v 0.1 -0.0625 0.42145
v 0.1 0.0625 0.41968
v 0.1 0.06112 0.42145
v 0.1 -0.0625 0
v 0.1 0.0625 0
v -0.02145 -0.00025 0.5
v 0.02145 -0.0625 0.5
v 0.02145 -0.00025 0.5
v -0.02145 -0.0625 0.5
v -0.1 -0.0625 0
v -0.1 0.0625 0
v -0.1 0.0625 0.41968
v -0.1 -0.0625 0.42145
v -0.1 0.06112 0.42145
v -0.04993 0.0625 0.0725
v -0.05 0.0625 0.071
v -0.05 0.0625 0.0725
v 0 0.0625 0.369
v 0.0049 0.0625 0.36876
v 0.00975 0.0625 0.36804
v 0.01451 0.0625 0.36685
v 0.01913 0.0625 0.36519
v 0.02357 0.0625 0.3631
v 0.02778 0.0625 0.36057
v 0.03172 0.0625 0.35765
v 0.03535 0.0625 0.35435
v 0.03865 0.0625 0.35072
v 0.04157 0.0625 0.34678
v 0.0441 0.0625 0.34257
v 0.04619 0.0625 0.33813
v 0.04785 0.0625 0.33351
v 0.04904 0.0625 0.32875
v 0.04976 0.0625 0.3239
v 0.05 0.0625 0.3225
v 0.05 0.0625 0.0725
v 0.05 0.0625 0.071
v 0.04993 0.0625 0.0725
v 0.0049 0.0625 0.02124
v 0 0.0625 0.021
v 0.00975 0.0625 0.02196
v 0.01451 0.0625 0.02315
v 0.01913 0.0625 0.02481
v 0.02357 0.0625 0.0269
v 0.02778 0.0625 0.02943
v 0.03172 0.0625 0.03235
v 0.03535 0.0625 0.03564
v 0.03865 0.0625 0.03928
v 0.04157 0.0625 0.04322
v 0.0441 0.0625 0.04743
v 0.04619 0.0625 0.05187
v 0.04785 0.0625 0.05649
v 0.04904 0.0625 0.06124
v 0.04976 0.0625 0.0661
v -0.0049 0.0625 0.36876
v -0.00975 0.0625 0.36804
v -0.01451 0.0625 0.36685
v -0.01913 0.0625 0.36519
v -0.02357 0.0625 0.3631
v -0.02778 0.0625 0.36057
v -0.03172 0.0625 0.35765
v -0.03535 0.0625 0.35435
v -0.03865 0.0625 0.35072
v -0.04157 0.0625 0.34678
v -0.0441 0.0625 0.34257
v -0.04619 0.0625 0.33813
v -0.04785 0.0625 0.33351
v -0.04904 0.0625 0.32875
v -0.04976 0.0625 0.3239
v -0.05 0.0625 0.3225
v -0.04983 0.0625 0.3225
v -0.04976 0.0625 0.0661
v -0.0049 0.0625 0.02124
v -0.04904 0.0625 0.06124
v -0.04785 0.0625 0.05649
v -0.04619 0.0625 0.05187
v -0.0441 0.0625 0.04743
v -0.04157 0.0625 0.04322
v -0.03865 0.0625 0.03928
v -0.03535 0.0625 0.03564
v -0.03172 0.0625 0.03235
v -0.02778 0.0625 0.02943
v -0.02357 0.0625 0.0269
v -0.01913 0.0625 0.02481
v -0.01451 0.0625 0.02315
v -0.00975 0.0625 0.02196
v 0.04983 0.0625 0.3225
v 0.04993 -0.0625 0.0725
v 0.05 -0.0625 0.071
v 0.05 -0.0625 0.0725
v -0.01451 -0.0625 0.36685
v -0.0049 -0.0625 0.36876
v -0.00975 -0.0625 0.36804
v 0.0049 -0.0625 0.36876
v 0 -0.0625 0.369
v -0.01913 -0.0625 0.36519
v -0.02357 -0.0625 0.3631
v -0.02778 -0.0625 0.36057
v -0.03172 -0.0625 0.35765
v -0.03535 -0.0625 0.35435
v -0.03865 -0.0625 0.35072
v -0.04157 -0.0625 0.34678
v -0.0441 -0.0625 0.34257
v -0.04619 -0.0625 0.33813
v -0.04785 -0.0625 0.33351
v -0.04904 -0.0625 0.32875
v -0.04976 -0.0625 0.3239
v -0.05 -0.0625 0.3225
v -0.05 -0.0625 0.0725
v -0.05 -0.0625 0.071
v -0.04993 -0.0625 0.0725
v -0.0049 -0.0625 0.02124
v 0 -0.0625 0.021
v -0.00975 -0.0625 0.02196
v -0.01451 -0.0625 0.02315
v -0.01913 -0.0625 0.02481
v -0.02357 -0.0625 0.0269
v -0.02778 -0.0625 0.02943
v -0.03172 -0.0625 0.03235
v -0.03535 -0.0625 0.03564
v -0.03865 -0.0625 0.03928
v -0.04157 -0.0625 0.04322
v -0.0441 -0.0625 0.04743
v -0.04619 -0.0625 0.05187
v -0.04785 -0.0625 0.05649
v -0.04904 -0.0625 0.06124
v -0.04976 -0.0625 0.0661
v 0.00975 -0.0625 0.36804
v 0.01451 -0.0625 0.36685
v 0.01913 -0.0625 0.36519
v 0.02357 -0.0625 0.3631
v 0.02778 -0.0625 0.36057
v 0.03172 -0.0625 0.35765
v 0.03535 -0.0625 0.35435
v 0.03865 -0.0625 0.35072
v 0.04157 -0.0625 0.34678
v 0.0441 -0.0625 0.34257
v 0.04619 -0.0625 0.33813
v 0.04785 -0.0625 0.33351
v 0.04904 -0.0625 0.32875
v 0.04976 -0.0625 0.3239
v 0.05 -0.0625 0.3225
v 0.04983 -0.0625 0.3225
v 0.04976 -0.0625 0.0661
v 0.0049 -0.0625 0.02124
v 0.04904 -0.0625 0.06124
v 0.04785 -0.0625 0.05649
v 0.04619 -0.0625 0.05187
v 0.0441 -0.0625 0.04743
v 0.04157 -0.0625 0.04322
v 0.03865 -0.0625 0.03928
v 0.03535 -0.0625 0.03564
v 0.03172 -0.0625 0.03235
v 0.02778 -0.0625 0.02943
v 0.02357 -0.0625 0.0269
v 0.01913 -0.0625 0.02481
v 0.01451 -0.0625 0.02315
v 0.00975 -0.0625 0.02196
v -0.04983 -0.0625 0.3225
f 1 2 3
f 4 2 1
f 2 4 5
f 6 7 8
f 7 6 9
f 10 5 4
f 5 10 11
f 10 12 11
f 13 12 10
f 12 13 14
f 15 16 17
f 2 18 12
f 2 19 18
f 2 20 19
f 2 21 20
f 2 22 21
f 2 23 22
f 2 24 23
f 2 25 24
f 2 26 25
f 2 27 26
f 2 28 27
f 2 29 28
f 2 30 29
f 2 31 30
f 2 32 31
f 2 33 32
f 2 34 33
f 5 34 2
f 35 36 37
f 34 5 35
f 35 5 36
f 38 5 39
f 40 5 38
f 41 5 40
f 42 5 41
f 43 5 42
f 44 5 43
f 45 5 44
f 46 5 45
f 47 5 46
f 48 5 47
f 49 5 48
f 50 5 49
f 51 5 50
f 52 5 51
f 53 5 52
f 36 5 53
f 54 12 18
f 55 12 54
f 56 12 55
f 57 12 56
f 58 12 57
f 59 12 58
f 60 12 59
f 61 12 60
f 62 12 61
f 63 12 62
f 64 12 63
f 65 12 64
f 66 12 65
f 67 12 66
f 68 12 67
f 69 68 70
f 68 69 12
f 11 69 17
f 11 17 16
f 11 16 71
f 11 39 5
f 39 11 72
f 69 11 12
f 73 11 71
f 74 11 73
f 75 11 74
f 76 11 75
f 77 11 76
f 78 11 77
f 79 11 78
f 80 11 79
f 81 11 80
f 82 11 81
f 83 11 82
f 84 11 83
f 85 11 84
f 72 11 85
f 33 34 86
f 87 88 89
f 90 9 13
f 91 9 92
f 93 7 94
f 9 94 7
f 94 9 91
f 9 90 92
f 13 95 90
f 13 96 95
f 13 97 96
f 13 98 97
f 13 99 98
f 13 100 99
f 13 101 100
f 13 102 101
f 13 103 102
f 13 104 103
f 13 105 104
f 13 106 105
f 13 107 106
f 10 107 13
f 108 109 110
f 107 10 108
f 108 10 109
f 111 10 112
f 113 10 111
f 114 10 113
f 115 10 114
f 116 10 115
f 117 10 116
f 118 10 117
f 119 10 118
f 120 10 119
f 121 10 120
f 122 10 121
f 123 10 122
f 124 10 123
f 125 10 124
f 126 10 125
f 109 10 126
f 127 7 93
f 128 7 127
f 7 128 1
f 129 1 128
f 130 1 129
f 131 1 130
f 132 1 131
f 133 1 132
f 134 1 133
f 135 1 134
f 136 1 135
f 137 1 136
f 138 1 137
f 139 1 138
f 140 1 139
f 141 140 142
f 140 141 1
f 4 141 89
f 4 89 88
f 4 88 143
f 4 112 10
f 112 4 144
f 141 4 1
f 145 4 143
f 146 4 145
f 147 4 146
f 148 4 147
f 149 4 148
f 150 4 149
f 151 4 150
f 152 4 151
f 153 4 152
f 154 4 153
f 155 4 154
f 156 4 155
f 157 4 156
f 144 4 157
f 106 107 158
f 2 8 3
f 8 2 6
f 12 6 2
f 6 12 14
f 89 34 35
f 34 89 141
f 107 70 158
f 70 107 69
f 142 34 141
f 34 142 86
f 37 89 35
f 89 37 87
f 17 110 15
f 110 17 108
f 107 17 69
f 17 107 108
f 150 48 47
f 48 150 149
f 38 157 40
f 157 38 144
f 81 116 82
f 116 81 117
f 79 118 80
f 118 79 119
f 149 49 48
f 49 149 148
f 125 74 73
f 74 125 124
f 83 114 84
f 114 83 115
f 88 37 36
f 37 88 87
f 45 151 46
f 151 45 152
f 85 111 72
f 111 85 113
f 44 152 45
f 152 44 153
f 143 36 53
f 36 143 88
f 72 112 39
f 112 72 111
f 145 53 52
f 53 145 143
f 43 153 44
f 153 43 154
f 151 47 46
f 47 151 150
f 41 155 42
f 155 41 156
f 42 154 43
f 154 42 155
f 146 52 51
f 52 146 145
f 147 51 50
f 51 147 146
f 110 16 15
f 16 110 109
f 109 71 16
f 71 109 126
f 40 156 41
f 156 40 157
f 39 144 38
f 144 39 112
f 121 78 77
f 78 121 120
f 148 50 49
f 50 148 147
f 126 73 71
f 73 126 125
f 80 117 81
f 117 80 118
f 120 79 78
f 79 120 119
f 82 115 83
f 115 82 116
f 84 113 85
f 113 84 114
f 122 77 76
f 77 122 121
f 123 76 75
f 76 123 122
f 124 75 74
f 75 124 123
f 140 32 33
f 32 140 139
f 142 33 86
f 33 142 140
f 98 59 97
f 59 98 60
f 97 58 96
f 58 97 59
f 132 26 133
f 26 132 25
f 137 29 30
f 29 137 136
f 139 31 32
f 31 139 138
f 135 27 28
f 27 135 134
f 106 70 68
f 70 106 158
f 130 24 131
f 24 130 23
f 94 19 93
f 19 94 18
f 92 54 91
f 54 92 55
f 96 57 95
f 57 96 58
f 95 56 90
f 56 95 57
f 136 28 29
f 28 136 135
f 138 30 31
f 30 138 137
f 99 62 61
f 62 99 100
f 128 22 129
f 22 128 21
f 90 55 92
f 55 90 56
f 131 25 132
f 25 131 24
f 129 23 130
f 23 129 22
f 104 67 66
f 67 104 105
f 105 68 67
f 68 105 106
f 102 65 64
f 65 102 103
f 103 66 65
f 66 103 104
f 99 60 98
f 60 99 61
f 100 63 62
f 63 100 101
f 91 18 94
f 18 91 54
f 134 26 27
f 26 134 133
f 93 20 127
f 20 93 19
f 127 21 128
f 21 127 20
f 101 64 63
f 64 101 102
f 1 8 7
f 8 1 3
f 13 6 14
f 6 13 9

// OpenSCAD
// ----------------------------------------------------------------------------------------------------
// PROJECT INFORMATION

// NAME:  Robot Body
// REVISION:  A1
// START DATE:  7/4/2023
// CURRENT VERSION DATE:  7/12/2023
// LICENSE:  GPLv3
// AUTHOR:  Justin Grimes (@zelon88)
// DESCRIPTION:  A body for tracked robot.
// ----------------------------------------------------------------------------------------------------

// ----------------------------------------------------------------------------------------------------
// PART INFORMATION

// NAME:  Robot Body Fastener Half
// REVISION:  A1
// START DATE:  7/11/2023
// CURRENT VERSION DATE:  7/12/2023
// AUTHOR:  Justin Grimes (@zelon88)
// DESCRIPTION:  
//    A fastener for joining body panels together.
//    The purpose of this part is to modularize the design of body fasteners.
//    This part does not need to be printed.
// FILE NAME: Robot_Body_008.scad
// ----------------------------------------------------------------------------------------------------

// ----------------------------------------------------------------------------------------------------
// PRINTER CONFIGURATION

// ----------------------------------------------------------------------------------------------------

// ----------------------------------------------------------------------------------------------------
// MANUFACTURING INSTRUCTIONS

// ----------------------------------------------------------------------------------------------------

// ----------------------------------------------------------------------------------------------------
// MODULES

// ----------------------------------------------------------------------------------------------------

// ----------------------------------------------------------------------------------------------------
// GEOMETRY

// 45 Degree Body Fastener.
difference() { 
  // Body of Fastener.
  translate([0, 0, 0.25]) cube([0.2, 0.125, 0.5], center=true);

  // Tapered Edge.
  translate([0, 0.04, 0.55]) rotate([38, 0, 0]) cube([0.5, 0.125, .5], center=true);

  // Upper Slot.
  translate([0, 0, 0.1975]) cube([0.1, 0.125, .25], center=true);

  // Inner Radius of Slot.
  translate([0, 0, 0.071]) rotate([90, 0, 0]) cylinder(r=0.05, h=0.125, $fn=64, center=true);

  // Outer Radius of Slot.
  translate([0, 0, 0.319]) rotate([90, 0, 0]) cylinder(r=0.05, h=0.125, $fn=64, center=true);

  // Edge Chamfers.
  translate([0.3125, 0, 0.5625]) rotate([0, 45, 0]) cube([0.5, 0.5, 0.5], center=true);
  translate([-0.3125, 0, 0.5625]) rotate([0, 45, 0]) cube([0.5, 0.5, 0.5], center=true); }
// ----------------------------------------------------------------------------------------------------
